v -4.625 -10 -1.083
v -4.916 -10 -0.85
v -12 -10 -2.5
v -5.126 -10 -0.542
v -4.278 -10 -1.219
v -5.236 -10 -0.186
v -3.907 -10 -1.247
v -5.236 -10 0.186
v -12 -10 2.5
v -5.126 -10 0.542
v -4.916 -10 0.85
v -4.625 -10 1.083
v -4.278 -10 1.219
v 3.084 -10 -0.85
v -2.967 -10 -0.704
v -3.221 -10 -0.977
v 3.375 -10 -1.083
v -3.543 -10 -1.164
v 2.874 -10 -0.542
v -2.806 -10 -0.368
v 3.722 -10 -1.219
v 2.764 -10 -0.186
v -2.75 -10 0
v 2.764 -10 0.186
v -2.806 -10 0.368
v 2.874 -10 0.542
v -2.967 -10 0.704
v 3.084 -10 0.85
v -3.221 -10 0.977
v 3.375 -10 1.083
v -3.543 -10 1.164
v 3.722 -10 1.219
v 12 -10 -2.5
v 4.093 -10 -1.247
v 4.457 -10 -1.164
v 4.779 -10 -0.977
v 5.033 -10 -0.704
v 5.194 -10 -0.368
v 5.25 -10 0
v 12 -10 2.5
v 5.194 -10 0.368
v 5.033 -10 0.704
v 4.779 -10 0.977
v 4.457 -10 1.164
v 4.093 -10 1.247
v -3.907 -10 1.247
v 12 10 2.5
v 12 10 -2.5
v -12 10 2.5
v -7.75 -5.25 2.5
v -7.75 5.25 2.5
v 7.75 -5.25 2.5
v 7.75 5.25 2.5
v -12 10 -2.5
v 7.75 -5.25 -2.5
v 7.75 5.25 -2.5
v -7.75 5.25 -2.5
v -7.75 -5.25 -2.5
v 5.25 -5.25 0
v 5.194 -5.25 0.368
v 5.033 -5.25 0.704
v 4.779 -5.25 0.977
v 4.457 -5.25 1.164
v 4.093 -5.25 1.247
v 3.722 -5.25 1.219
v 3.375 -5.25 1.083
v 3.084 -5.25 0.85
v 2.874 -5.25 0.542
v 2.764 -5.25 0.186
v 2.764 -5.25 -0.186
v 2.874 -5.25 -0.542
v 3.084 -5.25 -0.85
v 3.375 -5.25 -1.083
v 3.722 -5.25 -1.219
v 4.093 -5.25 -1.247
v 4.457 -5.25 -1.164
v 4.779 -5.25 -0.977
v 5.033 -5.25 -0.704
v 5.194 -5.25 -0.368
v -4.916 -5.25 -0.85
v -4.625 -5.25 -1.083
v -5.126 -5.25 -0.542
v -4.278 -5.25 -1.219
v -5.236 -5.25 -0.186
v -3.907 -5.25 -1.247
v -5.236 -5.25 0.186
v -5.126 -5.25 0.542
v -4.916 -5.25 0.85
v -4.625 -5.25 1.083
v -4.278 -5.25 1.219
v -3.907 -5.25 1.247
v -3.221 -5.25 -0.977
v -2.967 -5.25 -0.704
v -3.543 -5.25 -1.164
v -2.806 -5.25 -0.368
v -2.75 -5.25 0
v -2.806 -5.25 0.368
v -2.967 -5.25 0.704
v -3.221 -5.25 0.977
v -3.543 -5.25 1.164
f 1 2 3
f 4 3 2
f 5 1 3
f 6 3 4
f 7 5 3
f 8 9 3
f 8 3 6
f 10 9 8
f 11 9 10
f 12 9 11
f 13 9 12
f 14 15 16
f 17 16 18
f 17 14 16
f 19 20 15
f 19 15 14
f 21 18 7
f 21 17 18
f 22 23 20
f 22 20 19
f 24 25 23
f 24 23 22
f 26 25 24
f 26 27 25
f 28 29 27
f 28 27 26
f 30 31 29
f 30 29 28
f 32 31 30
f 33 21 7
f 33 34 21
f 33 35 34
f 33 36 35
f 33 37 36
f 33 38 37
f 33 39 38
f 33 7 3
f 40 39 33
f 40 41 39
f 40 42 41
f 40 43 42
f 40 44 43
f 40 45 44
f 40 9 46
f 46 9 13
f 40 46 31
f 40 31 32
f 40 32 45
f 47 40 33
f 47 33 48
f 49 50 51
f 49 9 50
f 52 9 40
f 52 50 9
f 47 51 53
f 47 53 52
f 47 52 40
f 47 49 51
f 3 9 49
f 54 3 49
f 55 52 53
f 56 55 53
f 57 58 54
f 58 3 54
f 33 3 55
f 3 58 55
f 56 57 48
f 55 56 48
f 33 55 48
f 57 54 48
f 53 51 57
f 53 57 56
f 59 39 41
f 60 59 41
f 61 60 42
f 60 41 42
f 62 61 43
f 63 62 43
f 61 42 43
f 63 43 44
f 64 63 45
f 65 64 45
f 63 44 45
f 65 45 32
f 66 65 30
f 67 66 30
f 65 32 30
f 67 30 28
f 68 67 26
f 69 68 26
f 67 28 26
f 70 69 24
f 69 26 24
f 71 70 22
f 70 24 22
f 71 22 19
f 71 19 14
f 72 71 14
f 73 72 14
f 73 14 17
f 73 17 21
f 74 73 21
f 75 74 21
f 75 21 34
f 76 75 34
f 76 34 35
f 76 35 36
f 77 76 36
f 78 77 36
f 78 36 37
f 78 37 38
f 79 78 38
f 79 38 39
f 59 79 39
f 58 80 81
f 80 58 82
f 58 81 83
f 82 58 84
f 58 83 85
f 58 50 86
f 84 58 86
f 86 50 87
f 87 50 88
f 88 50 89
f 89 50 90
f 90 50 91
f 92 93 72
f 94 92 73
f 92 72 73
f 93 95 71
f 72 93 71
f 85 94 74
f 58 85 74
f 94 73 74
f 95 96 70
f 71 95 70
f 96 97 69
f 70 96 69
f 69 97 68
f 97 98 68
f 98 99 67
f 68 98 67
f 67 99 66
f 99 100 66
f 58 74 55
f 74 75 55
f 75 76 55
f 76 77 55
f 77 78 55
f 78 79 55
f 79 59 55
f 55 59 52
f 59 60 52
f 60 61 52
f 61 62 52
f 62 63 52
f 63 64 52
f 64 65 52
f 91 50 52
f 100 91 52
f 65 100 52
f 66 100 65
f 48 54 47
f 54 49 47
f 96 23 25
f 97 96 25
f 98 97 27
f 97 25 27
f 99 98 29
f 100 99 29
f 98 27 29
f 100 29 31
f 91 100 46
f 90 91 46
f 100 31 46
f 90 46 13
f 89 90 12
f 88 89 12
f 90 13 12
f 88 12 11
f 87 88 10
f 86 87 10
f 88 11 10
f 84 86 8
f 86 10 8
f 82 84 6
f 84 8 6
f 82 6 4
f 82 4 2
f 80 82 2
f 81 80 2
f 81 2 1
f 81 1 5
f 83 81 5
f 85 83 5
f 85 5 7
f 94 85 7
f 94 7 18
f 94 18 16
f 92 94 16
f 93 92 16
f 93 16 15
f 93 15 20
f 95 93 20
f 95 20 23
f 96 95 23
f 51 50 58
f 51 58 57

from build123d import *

# Parameters (mm, degrees)
SKETCH_1_W          = 24
SKETCH_1_H          = 20
EXTRUDE_1_DEPTH     = 2.5
SKETCH_2_W          = 15.5
SKETCH_2_H          = 10.5
CUT_EXTRUDE_1_DEPTH = 6
CUT_EXTRUDE_2_REACH = 22
SKETCH_4_R          = 1.25


with BuildPart() as part:
    # 草圖1 → 填料-伸長1 (new body, symmetric)
    with BuildSketch(Plane.XY):
        Rectangle(SKETCH_1_W, SKETCH_1_H)
    extrude(amount=EXTRUDE_1_DEPTH, both=True)

    # 草圖2 → 除料-伸長1 (cut, through all)
    with BuildSketch(Plane.XY.offset(2.5)):
        Rectangle(SKETCH_2_W, SKETCH_2_H)
    extrude(amount=-CUT_EXTRUDE_1_DEPTH, mode=Mode.SUBTRACT)

    # 草圖4 → 除料-伸長2 (cut, up to next)
    with BuildSketch(Plane.XZ.offset(10), mode=Mode.PRIVATE) as cut_extrude_2_sk1:
        with Locations((-4, 0)):
            Circle(SKETCH_4_R)
    cut_extrude_2_tool1 = extrude(cut_extrude_2_sk1.sketch, amount=-CUT_EXTRUDE_2_REACH, mode=Mode.PRIVATE) & part.part
    add(cut_extrude_2_tool1.solids().sort_by_distance((-4, -10, 0))[0], mode=Mode.SUBTRACT)
    # 草圖4 → 除料-伸長2 (cut, up to next)
    with BuildSketch(Plane.XZ.offset(10), mode=Mode.PRIVATE) as cut_extrude_2_sk2:
        with Locations((4, 0)):
            Circle(SKETCH_4_R)
    cut_extrude_2_tool2 = extrude(cut_extrude_2_sk2.sketch, amount=-CUT_EXTRUDE_2_REACH, mode=Mode.PRIVATE) & part.part
    add(cut_extrude_2_tool2.solids().sort_by_distance((4, -10, 0))[0], mode=Mode.SUBTRACT)


solid = part.part
